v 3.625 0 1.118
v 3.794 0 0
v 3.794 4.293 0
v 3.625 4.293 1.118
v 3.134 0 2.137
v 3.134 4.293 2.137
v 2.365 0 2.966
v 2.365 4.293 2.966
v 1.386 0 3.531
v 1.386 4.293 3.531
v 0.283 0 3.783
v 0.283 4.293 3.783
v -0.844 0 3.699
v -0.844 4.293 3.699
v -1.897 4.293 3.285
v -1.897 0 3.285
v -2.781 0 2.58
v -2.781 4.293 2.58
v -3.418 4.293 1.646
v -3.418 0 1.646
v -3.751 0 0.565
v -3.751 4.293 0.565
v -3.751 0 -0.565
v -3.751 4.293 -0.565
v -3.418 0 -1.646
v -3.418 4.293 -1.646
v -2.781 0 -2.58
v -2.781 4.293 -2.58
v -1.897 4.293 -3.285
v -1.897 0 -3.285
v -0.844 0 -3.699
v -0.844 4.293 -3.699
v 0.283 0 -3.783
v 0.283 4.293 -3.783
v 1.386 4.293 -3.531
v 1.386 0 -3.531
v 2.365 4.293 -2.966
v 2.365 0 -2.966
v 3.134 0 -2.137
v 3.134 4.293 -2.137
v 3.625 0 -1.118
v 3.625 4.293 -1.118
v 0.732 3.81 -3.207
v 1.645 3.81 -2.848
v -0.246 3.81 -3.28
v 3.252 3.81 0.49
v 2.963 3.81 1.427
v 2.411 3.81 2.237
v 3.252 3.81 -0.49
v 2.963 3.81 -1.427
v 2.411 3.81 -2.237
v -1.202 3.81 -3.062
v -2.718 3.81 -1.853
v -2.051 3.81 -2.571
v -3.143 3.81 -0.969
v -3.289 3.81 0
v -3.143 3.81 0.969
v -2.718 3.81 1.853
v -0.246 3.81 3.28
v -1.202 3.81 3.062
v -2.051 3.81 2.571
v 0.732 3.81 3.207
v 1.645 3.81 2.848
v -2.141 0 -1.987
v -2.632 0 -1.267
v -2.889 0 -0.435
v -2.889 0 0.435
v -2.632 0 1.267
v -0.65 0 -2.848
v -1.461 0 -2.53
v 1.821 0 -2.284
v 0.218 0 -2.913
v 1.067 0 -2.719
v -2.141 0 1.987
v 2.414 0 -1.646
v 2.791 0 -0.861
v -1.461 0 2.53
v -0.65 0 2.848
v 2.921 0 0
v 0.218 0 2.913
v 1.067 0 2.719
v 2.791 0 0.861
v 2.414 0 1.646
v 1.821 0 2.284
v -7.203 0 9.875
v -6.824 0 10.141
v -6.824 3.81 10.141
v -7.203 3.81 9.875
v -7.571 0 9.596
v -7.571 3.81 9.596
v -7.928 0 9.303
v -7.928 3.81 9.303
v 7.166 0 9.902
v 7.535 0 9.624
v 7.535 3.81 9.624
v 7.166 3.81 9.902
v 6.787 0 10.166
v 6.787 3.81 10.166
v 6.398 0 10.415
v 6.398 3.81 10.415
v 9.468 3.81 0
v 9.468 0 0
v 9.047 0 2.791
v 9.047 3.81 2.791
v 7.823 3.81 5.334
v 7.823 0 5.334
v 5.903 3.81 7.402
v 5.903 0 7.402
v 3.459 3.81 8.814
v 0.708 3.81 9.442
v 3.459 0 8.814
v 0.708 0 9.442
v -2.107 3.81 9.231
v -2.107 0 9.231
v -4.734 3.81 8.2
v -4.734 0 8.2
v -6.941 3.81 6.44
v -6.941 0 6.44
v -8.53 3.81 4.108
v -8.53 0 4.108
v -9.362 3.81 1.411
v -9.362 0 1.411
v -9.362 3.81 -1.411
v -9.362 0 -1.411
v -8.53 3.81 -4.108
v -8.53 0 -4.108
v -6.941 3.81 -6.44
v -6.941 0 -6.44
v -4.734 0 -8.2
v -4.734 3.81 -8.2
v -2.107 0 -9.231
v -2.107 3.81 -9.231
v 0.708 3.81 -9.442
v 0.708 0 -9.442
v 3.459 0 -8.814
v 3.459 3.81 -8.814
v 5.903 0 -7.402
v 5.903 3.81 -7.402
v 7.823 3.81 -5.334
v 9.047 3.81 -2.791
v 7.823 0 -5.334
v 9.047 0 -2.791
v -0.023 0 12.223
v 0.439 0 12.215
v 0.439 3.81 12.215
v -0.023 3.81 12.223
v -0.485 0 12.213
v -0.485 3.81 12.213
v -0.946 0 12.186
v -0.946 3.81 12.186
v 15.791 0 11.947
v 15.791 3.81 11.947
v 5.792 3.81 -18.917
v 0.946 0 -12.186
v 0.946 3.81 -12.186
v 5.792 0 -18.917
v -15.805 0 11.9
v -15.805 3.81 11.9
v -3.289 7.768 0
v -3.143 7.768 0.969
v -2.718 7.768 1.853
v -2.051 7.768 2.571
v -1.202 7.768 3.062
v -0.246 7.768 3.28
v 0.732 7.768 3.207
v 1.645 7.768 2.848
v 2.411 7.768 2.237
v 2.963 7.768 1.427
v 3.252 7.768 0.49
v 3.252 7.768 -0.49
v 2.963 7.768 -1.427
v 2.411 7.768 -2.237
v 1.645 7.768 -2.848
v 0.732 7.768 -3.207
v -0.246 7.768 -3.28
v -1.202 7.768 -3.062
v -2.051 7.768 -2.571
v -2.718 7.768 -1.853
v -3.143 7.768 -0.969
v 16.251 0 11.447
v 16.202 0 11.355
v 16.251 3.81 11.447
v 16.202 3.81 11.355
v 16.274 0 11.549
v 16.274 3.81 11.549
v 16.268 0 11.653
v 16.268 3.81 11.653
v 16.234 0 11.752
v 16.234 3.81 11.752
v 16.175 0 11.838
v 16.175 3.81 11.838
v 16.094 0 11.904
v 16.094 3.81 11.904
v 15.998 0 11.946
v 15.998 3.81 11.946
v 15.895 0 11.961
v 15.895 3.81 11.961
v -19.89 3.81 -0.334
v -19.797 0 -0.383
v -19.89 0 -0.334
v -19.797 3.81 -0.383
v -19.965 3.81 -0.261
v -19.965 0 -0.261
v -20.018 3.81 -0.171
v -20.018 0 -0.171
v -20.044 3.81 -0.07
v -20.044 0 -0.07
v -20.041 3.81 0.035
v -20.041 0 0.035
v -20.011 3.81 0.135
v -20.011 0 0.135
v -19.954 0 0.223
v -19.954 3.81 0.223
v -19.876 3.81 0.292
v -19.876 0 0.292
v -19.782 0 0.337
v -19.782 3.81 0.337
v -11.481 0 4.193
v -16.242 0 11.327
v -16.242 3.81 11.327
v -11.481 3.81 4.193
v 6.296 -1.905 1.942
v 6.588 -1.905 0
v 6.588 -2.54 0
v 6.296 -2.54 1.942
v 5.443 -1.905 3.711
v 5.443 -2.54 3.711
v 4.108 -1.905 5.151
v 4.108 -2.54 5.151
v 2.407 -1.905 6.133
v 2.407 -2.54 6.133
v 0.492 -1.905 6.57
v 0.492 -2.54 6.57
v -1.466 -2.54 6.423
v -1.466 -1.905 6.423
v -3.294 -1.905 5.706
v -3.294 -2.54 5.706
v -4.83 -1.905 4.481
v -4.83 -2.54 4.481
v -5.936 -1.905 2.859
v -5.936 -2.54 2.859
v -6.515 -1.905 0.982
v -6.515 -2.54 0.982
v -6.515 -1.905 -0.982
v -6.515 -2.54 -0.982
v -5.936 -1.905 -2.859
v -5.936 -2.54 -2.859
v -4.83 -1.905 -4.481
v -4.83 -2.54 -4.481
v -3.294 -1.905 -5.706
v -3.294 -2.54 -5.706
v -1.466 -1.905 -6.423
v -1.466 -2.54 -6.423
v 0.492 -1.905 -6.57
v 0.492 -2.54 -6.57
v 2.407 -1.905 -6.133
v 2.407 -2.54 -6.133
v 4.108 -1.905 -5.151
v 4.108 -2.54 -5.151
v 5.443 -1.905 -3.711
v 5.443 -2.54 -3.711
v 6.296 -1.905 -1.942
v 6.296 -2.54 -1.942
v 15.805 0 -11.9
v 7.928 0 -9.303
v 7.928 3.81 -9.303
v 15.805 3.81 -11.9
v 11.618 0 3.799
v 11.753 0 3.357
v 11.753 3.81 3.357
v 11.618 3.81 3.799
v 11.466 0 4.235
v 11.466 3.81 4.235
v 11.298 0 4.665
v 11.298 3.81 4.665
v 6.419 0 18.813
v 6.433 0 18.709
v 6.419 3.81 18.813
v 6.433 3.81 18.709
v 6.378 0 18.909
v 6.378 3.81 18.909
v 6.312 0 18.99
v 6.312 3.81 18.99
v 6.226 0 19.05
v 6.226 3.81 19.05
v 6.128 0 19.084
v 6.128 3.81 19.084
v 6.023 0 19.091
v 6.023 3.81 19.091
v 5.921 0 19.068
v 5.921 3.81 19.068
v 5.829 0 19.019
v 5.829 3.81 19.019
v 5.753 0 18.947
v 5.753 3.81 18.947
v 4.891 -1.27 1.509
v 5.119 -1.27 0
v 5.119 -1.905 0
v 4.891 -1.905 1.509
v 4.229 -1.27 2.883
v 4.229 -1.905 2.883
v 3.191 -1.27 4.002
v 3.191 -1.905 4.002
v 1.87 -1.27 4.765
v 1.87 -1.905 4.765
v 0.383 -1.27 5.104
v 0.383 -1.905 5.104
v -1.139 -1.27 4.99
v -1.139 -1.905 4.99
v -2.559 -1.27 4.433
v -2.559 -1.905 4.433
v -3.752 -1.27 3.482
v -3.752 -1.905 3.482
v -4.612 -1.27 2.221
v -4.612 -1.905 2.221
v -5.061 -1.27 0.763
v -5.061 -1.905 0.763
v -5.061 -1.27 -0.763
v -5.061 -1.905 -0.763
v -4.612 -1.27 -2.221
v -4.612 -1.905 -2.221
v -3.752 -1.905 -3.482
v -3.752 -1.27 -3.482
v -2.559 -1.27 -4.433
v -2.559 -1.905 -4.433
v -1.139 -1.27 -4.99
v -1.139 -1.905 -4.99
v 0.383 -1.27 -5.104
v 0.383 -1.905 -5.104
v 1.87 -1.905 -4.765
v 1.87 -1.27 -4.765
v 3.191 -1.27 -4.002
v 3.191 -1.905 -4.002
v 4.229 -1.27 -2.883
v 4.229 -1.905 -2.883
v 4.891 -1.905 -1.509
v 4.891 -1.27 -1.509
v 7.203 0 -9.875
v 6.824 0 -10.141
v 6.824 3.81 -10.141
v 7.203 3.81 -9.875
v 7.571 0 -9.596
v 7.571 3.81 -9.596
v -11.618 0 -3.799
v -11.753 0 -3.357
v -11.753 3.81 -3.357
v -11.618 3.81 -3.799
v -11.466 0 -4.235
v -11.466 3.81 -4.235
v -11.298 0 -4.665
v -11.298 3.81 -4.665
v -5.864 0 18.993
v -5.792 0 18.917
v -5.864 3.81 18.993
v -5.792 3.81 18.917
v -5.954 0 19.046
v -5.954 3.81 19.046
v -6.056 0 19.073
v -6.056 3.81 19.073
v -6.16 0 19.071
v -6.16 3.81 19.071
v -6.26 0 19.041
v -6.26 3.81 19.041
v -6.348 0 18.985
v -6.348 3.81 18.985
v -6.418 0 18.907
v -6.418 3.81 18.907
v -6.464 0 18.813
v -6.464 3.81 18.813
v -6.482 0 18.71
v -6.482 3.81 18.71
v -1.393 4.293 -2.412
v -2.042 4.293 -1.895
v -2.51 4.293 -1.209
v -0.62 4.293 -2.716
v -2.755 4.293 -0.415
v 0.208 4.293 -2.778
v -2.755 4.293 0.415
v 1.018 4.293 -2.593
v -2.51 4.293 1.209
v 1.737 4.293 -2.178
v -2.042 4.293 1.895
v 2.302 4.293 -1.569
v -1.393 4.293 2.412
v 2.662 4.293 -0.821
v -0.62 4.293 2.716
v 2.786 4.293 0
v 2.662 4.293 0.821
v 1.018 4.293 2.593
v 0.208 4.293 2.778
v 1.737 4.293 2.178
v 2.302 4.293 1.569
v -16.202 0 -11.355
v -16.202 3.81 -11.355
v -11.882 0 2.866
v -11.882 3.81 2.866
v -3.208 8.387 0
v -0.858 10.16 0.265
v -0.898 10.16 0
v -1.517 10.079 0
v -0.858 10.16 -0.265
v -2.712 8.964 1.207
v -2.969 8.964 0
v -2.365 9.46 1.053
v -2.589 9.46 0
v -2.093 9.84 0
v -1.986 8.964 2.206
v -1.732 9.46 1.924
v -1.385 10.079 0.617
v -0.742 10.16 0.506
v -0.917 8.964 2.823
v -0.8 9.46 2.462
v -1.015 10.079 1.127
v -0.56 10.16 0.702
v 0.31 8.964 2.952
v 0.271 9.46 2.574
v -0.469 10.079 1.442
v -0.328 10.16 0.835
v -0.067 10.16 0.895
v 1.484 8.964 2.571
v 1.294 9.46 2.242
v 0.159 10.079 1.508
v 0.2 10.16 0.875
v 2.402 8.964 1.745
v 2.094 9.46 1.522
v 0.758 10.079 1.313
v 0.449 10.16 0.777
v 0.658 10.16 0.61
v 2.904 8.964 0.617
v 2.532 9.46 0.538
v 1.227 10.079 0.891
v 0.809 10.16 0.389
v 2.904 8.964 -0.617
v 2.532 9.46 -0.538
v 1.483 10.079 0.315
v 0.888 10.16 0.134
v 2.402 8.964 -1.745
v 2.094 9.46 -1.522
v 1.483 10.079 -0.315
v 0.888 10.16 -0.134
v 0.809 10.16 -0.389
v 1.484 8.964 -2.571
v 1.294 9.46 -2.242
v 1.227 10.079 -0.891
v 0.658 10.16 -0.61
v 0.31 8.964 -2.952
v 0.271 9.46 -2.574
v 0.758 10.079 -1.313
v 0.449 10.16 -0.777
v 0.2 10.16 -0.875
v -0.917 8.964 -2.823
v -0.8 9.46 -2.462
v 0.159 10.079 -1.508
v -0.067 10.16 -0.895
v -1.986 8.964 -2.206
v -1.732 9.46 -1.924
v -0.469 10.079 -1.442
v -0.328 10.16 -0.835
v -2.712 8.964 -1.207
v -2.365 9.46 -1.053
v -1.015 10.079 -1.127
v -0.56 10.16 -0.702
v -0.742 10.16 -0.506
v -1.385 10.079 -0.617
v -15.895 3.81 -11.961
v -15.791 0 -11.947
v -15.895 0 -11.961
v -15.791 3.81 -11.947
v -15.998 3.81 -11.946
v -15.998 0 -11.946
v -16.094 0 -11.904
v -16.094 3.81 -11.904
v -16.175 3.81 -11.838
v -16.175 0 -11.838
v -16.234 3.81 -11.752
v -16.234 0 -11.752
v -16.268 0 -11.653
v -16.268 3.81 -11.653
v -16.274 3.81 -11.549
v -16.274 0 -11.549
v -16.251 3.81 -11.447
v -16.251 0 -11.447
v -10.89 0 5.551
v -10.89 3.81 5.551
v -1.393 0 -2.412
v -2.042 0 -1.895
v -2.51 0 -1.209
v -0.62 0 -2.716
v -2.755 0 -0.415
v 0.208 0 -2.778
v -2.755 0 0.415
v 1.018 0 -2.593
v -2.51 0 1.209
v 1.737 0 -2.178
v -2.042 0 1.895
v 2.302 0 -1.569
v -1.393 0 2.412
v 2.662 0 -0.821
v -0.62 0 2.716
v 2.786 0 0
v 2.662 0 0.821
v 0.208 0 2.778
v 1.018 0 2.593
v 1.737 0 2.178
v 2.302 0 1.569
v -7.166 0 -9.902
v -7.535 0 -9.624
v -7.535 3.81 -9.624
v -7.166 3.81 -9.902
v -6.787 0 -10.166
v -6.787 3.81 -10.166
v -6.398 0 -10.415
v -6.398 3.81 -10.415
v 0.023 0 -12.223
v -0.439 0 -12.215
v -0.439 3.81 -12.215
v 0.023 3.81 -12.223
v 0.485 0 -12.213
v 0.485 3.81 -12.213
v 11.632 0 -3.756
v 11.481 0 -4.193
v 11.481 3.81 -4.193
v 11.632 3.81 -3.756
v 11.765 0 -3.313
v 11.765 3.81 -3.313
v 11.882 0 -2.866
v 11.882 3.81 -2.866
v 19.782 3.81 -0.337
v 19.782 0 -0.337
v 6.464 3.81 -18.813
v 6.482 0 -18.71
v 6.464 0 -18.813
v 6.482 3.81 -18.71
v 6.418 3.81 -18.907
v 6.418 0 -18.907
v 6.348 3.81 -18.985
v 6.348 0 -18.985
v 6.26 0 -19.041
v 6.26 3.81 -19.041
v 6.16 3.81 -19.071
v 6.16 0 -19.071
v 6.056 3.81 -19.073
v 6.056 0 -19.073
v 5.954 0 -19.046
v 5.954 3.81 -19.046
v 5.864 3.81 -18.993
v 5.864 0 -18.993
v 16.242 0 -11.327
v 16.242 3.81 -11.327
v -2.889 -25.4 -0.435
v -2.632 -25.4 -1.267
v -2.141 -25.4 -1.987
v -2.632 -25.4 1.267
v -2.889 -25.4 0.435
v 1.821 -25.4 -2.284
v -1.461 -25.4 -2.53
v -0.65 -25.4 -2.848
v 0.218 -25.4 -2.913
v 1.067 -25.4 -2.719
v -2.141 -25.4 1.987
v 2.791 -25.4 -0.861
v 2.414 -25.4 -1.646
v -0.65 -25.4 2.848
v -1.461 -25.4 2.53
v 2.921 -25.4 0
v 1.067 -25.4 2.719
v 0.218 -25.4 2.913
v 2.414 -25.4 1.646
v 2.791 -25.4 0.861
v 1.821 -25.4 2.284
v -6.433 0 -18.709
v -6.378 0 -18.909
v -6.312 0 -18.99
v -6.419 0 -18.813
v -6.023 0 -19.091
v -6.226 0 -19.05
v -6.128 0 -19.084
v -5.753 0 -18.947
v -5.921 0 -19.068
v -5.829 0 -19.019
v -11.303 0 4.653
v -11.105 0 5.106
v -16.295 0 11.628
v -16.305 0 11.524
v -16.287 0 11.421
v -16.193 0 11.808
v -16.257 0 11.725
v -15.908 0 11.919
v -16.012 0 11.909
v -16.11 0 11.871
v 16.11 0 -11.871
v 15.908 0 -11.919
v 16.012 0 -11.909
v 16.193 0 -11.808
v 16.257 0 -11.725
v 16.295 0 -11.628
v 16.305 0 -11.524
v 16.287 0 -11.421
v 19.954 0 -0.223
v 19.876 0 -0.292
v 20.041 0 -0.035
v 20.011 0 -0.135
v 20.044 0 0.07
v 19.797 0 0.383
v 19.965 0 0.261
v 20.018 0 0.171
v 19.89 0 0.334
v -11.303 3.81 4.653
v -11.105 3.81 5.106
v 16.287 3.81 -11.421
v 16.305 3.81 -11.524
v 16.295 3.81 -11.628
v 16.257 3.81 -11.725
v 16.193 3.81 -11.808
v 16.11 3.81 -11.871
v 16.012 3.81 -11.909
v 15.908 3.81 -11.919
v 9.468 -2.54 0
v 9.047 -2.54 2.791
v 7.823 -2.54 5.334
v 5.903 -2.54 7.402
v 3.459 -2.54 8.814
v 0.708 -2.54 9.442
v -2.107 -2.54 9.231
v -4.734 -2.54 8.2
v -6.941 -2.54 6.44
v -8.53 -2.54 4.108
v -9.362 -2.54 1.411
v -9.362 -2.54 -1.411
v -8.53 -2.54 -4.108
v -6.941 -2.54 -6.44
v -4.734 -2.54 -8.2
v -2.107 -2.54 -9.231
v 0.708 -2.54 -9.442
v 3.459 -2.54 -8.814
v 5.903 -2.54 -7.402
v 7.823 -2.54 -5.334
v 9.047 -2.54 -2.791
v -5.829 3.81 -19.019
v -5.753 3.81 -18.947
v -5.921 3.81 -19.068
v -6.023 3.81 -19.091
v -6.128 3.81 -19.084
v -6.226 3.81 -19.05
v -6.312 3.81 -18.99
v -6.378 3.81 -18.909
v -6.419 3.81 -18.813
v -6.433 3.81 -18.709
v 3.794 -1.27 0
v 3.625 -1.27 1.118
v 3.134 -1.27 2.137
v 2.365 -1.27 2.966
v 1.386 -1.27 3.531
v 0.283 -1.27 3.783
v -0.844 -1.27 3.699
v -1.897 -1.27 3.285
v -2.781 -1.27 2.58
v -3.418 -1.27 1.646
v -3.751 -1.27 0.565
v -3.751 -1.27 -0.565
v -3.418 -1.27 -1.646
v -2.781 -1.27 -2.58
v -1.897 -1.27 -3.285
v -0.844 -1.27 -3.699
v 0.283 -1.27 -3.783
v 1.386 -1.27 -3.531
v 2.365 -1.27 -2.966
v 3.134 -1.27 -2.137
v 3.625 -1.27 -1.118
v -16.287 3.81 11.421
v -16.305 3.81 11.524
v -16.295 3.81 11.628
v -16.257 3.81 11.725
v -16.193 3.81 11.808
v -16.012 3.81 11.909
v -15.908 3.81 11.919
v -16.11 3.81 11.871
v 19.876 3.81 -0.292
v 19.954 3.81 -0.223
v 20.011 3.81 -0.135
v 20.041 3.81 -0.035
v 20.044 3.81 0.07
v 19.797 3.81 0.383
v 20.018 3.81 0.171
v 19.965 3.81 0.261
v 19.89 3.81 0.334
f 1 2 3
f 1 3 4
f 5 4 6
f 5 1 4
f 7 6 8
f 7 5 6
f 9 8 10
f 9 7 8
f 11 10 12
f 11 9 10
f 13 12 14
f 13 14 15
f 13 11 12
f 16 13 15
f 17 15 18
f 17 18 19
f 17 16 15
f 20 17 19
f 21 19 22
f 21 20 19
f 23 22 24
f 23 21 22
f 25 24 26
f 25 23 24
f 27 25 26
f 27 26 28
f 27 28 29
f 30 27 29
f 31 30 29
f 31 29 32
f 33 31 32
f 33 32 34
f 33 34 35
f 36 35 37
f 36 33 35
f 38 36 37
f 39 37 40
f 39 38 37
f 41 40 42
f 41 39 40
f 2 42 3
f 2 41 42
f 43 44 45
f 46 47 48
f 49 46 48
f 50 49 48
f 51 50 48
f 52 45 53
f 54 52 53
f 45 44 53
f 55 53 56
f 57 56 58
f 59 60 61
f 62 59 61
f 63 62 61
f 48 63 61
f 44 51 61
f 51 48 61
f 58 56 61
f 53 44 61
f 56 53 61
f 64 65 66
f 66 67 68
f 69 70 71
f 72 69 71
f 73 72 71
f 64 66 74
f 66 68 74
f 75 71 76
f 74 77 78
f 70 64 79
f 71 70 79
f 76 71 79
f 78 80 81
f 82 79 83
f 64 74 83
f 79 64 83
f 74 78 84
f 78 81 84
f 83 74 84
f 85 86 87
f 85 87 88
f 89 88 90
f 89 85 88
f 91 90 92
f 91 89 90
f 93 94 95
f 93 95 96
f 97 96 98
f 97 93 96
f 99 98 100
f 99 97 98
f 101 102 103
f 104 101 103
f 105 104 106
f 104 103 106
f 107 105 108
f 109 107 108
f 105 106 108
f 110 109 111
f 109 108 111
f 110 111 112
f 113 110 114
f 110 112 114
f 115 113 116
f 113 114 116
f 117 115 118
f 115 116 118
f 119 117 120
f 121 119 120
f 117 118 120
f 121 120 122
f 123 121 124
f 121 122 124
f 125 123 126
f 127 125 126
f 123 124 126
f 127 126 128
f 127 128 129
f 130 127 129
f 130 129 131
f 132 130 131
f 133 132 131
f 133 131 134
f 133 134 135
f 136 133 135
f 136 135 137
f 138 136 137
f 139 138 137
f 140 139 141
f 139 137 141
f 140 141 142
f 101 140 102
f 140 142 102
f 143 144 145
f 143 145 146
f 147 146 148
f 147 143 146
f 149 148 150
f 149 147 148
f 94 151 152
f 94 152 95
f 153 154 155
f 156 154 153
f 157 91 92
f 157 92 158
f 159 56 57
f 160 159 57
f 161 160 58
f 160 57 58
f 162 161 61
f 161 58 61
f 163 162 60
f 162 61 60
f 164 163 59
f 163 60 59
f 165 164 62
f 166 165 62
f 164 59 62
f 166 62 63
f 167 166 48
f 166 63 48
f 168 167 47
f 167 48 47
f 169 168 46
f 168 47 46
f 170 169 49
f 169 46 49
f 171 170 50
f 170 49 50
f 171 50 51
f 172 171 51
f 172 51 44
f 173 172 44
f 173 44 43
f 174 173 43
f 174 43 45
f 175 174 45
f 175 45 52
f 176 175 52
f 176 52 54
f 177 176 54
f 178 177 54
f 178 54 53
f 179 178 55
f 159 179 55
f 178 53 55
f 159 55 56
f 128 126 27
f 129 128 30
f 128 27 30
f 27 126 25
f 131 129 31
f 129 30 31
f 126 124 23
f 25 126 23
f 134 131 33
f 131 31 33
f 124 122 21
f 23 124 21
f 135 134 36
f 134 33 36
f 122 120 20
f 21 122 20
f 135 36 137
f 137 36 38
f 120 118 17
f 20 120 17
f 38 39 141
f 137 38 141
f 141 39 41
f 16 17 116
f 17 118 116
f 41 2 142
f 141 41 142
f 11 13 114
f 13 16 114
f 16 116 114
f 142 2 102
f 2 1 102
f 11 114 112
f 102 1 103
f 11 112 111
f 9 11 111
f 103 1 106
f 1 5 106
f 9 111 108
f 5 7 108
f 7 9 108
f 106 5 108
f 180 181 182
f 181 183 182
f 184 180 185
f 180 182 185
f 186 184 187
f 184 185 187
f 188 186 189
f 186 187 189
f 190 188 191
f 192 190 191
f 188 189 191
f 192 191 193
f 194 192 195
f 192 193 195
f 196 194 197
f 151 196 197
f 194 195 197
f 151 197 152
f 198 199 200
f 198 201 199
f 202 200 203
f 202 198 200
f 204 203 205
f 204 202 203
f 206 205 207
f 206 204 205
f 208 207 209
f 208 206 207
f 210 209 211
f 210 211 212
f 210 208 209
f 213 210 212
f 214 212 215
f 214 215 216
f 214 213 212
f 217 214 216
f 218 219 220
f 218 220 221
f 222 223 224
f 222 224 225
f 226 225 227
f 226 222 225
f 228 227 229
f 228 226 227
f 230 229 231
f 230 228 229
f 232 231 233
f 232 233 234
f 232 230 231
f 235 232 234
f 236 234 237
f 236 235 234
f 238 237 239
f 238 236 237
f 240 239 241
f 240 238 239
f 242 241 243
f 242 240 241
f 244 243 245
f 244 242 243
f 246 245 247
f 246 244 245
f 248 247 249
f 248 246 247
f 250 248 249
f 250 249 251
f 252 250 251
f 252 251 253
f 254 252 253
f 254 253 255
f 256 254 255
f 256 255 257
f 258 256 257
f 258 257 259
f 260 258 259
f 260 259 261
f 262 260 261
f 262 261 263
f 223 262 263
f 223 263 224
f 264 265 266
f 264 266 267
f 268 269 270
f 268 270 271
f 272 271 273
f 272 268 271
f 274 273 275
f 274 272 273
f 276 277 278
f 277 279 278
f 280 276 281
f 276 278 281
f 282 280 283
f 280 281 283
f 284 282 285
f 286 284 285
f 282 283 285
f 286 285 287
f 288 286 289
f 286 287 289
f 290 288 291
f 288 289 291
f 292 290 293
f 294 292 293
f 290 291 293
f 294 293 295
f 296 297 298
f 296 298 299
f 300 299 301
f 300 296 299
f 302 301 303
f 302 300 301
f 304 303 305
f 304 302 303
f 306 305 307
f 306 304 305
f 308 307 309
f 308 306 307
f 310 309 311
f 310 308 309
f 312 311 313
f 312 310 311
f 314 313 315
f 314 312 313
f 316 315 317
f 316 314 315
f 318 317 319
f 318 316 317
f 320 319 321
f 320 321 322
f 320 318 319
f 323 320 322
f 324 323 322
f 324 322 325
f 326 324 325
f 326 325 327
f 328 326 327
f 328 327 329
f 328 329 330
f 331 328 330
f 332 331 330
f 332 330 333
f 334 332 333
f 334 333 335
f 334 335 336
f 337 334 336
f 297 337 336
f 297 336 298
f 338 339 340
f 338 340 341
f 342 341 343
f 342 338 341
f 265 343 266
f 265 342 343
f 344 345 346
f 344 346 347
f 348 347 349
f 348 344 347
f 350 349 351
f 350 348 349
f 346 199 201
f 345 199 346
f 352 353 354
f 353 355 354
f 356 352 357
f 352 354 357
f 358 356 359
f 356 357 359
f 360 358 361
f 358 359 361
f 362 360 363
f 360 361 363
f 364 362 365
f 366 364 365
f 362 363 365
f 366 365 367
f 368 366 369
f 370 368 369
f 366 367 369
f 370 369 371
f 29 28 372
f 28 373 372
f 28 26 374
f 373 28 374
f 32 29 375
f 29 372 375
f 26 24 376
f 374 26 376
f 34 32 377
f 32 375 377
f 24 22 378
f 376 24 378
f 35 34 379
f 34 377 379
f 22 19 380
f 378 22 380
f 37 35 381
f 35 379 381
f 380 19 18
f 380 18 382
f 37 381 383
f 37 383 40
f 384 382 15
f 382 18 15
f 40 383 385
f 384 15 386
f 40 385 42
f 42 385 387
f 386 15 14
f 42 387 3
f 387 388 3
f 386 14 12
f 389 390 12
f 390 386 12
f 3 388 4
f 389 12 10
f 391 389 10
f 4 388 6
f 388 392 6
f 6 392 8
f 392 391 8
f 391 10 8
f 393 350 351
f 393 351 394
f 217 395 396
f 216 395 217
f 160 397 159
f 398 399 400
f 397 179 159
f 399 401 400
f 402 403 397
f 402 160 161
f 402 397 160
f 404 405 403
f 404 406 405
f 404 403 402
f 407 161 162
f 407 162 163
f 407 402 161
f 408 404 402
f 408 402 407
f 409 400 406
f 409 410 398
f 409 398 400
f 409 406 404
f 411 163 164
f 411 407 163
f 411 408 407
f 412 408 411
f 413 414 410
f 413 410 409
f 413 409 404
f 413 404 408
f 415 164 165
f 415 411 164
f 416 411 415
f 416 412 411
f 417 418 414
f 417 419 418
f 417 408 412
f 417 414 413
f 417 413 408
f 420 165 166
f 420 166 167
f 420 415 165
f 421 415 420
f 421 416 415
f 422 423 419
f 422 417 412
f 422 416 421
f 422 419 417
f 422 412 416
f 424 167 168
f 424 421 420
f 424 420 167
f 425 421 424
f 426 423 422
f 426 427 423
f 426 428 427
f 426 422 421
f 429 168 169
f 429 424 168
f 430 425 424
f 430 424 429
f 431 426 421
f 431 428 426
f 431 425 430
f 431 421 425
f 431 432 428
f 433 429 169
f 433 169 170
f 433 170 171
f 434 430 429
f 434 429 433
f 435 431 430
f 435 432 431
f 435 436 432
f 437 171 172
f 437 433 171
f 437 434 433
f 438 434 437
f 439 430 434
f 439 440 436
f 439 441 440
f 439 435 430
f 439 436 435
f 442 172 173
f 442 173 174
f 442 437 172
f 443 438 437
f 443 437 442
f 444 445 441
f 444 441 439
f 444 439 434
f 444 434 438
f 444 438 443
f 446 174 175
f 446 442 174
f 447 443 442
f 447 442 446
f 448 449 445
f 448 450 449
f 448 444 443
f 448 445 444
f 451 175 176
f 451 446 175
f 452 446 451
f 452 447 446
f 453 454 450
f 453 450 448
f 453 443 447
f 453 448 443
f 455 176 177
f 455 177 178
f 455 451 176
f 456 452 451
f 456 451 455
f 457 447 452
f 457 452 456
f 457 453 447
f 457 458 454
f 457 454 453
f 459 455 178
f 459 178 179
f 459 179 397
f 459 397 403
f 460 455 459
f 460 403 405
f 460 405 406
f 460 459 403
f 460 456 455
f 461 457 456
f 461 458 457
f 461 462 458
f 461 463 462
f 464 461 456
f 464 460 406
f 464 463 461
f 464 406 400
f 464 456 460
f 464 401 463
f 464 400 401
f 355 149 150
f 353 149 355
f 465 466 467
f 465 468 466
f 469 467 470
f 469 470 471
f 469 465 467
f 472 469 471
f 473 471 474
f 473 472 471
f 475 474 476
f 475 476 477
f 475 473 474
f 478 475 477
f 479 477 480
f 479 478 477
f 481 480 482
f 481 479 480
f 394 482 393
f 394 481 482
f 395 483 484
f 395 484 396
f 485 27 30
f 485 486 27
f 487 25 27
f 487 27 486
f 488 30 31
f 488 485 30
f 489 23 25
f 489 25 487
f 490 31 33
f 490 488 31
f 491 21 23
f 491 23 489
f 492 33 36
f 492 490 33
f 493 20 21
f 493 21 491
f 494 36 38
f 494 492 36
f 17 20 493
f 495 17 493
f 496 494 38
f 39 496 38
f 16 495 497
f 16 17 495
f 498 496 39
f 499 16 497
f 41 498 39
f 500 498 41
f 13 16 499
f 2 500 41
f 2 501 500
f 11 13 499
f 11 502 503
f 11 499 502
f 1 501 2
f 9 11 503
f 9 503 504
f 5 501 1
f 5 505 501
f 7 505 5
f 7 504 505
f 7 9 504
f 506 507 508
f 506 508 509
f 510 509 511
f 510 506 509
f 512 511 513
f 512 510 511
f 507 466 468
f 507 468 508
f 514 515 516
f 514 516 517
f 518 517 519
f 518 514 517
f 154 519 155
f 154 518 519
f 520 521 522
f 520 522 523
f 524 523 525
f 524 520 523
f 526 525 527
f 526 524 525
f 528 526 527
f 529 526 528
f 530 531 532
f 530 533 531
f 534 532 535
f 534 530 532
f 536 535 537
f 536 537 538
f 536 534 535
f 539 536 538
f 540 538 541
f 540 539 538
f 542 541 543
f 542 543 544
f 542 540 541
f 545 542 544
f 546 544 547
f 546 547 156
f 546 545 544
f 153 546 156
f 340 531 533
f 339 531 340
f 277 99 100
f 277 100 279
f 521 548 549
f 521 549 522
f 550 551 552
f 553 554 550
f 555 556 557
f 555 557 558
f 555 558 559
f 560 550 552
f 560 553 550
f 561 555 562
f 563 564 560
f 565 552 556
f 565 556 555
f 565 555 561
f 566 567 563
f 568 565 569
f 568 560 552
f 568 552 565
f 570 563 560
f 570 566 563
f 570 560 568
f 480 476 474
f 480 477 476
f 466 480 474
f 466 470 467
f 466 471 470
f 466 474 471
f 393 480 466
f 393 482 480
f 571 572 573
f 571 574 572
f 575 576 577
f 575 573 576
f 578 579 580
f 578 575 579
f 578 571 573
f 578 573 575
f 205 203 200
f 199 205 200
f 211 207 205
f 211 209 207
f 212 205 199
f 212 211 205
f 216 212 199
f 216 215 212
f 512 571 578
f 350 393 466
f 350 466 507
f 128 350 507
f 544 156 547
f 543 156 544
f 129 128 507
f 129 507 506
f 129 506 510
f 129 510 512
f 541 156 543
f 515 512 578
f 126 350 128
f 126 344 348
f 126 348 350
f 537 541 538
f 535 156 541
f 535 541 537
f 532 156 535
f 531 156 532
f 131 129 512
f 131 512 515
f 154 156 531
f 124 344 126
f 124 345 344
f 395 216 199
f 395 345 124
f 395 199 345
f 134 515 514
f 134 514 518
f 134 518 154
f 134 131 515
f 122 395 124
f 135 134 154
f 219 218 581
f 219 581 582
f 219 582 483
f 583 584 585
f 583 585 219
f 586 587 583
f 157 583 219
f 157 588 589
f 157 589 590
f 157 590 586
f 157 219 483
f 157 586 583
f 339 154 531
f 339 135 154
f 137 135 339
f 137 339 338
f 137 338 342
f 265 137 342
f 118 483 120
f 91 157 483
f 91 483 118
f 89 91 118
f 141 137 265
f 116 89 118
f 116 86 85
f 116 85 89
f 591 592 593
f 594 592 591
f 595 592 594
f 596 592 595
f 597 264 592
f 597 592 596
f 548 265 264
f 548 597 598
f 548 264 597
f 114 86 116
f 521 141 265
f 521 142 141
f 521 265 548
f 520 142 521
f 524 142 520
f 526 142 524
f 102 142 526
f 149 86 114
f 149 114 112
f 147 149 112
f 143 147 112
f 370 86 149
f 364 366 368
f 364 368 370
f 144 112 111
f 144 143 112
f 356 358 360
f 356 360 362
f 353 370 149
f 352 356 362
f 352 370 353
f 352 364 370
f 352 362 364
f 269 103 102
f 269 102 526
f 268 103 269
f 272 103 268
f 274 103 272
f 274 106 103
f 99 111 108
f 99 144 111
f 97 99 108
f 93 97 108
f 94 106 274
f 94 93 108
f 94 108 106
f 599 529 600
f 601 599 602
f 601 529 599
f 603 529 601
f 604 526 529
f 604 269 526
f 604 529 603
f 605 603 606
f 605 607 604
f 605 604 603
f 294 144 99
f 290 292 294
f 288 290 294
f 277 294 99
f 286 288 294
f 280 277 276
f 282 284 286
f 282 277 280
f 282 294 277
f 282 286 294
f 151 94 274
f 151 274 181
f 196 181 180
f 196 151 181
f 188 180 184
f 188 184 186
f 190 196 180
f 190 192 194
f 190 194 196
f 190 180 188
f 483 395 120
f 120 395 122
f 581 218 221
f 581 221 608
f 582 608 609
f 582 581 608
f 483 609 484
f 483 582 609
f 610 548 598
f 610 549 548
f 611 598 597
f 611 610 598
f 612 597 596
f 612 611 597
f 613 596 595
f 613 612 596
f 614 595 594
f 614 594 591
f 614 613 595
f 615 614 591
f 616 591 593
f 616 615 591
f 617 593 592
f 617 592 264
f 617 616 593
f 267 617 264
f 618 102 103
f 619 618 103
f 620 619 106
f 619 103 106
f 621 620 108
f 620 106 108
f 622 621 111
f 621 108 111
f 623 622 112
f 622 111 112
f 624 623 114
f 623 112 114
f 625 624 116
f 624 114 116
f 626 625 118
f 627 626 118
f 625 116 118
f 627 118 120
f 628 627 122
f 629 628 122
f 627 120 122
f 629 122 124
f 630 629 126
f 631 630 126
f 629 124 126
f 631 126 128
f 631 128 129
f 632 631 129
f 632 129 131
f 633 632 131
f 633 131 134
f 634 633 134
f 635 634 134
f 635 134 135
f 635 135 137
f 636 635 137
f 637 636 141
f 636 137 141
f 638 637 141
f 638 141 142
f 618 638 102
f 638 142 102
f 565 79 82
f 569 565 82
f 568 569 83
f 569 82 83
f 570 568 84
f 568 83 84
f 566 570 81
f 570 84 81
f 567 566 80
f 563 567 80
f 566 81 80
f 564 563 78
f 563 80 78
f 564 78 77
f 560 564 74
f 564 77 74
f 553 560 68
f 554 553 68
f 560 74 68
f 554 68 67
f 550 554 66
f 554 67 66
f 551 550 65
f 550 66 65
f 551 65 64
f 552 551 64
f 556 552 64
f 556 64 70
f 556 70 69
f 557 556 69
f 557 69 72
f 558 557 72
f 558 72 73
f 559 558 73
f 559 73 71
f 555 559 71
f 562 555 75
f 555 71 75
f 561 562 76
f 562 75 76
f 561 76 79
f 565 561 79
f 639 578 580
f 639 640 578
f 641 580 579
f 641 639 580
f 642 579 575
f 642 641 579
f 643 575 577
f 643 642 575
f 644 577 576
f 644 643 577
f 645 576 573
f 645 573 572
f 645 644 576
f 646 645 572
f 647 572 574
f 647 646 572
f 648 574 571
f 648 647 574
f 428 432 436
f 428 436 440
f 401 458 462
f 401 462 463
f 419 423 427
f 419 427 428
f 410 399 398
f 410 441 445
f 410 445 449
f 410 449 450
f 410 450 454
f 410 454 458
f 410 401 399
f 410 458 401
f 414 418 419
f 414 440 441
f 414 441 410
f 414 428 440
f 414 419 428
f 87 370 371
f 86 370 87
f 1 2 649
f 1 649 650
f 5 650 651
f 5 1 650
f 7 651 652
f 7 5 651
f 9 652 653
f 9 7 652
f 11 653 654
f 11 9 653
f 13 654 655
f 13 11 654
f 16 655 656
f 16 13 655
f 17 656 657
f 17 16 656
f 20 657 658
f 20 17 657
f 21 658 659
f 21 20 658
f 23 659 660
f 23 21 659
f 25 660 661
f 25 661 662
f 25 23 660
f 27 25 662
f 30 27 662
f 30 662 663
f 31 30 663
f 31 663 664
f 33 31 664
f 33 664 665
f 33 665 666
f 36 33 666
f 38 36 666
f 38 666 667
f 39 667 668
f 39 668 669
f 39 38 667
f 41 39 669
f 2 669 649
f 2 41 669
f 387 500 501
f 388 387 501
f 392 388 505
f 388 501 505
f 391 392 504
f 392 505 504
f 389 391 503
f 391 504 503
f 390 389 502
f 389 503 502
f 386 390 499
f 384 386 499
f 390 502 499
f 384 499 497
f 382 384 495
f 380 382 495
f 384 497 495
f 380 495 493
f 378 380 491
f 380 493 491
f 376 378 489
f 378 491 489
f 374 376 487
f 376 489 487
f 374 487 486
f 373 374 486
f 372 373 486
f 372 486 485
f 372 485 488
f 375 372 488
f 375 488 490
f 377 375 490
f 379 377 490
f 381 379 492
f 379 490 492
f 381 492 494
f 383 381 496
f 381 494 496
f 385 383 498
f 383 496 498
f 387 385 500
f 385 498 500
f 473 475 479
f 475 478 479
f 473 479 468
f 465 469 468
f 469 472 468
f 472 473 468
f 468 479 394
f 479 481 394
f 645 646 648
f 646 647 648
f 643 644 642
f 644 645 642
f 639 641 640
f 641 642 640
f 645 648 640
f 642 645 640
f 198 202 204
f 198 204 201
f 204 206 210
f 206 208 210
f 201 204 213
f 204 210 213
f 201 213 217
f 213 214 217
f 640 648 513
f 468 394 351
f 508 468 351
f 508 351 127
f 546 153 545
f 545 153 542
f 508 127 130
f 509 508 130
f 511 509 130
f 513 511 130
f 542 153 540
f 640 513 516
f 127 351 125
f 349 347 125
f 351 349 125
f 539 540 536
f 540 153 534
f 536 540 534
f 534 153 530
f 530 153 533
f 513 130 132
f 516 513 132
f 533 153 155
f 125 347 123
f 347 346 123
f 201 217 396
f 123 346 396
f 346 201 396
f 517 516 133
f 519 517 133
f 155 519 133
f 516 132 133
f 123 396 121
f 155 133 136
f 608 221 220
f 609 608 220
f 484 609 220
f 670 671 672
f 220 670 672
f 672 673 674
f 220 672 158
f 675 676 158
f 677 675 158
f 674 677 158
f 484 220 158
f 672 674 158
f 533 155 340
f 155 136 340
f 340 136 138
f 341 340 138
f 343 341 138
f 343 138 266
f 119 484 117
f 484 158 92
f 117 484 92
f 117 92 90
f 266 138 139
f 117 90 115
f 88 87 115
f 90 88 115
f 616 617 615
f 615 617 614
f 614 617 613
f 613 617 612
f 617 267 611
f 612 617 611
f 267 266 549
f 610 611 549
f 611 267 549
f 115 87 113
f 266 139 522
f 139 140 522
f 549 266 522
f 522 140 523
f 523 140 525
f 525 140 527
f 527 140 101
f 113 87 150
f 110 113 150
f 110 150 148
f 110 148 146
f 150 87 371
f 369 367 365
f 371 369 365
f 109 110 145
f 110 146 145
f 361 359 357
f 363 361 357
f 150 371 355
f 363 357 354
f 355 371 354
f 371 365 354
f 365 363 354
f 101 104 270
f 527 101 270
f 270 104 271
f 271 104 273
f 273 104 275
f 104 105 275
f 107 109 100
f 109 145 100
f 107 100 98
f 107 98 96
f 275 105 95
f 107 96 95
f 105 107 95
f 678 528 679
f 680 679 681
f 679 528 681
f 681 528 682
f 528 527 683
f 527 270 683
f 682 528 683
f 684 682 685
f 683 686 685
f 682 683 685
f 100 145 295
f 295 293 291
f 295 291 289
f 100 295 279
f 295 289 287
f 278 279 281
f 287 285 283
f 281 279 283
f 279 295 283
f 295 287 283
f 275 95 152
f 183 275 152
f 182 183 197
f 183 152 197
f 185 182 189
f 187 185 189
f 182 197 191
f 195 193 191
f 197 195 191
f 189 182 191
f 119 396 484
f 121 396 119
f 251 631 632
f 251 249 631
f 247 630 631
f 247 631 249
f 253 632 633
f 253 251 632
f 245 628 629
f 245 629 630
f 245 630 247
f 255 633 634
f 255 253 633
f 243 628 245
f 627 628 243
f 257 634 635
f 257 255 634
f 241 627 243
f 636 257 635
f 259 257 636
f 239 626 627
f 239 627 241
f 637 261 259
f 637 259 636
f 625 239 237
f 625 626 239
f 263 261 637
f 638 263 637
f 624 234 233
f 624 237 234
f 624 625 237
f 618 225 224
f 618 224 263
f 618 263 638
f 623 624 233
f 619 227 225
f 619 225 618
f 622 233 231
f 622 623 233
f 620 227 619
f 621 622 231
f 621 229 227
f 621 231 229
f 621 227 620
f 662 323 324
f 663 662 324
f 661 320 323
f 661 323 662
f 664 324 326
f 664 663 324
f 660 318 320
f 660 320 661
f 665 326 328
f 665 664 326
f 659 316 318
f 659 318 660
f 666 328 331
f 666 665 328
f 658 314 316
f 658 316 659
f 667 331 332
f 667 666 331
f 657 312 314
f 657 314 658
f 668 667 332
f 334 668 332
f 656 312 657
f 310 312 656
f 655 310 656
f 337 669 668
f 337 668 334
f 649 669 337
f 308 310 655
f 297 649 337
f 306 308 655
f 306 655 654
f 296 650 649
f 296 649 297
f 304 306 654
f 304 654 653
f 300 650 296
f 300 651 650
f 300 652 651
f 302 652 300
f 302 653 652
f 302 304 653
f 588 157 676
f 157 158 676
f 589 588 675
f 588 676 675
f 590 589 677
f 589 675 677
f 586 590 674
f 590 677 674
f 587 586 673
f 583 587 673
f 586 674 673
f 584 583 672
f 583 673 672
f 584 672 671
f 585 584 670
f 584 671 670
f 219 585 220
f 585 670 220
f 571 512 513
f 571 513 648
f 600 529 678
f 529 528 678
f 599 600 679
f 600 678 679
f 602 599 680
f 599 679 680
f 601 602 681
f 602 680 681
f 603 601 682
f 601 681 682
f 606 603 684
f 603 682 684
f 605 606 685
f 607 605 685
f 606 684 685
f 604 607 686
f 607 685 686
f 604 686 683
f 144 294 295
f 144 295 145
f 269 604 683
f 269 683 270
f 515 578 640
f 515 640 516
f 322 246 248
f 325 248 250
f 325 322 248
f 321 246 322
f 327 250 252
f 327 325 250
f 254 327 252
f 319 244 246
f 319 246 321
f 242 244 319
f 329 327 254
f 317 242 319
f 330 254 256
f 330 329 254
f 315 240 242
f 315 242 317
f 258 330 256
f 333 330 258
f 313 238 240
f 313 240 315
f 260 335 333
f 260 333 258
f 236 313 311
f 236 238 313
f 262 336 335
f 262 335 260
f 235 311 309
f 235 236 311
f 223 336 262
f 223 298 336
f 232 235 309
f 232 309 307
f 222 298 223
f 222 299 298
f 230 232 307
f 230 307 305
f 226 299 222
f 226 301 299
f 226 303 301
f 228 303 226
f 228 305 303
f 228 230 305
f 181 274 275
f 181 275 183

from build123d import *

# Parameters (mm, degrees)
F0_R      = 9.467987
F1_DEPTH  = 3.81
F2_R      = 2.921246
F3_DEPTH  = 25.4
F4_R      = 3.289061
F5_DEPTH  = 6.35
F6_R      = 0.381
F0_R_2    = 6.588266
F7_DEPTH  = 2.54
F0_R_3    = 5.118567
F8_DEPTH  = 1.905
F0_R_4    = 3.793635
F9_DEPTH  = 1.27
F0_R_5    = 2.785674
F10_DEPTH = 4.2926
F11_R     = 2.39152


with BuildPart() as f1:
    # F0 (on Front) → F1 (new body)
    with BuildSketch(Plane.XZ):
        with BuildLine():
            ThreePointArc((11.753054, 3.356683), (12.10494, 1.69471), (12.222995, 0))
            ThreePointArc((12.222995, 0), (12.137491, -1.443232), (11.882175, -2.866272))
            Line((11.882175, -2.866272), (20.8341, 0))
            Line((20.8341, 0), (11.753054, 3.356683))
        make_face()
        with BuildLine():
            ThreePointArc((7.535412, 9.623886), (9.737443, 7.388086), (11.297634, 4.665305))
            Line((11.297634, 4.665305), (16.855141, 12.245976))
            Line((16.855141, 12.245976), (7.535412, 9.623886))
        make_face()
        with BuildLine():
            ThreePointArc((-6.824289, 10.140547), (-4.017452, 11.543903), (-0.945807, 12.186347))
            Line((-0.945807, 12.186347), (-6.438091, 19.814406))
            Line((-6.438091, 19.814406), (-6.824289, 10.140547))
        make_face()
        with BuildLine():
            ThreePointArc((0.439498, 12.215091), (3.535148, 11.700613), (6.397781, 10.414894))
            Line((6.397781, 10.414894), (6.438091, 19.814406))
            Line((6.438091, 19.814406), (0.439498, 12.215091))
        make_face()
        with BuildLine():
            ThreePointArc((-10.889778, 5.551066), (-9.59415, 7.573235), (-7.928129, 9.30303))
            Line((-7.928129, 9.30303), (-16.855141, 12.245976))
            Line((-16.855141, 12.245976), (-11.481429, 4.192659))
            ThreePointArc((-11.481429, 4.192659), (-11.206206, 4.880835), (-10.889778, 5.551066))
        make_face()
        with BuildLine():
            ThreePointArc((-11.753054, -3.356683), (-12.220365, -0.253562), (-11.882175, 2.866272))
            Line((-11.882175, 2.866272), (-20.8341, 0))
            Line((-20.8341, 0), (-11.753054, -3.356683))
        make_face()
        with BuildLine():
            Line((-16.855141, -12.245976), (-7.535412, -9.623886))
            ThreePointArc((-7.535412, -9.623886), (-9.737443, -7.388086), (-11.297634, -4.665305))
            Line((-11.297634, -4.665305), (-16.855141, -12.245976))
        make_face()
        with BuildLine():
            Line((-6.438091, -19.814406), (-0.439498, -12.215091))
            ThreePointArc((-0.439498, -12.215091), (-3.535148, -11.700613), (-6.397781, -10.414894))
            Line((-6.397781, -10.414894), (-6.438091, -19.814406))
        make_face()
        with BuildLine():
            Line((6.438091, -19.814406), (6.824289, -10.140547))
            ThreePointArc((6.824289, -10.140547), (4.017452, -11.543903), (0.945807, -12.186347))
            Line((0.945807, -12.186347), (6.438091, -19.814406))
        make_face()
        with BuildLine():
            Line((16.855141, -12.245976), (11.481429, -4.192659))
            ThreePointArc((11.481429, -4.192659), (10.035523, -6.977814), (7.928129, -9.30303))
            Line((7.928129, -9.30303), (16.855141, -12.245976))
        make_face()
        with BuildLine():
            ThreePointArc((11.882175, -2.866272), (12.137491, -1.443232), (12.222995, 0))
            ThreePointArc((12.222995, 0), (12.10494, 1.69471), (11.753054, 3.356683))
            ThreePointArc((11.753054, 3.356683), (11.543903, 4.017452), (11.297634, 4.665305))
            ThreePointArc((11.297634, 4.665305), (9.737443, 7.388086), (7.535412, 9.623886))
            ThreePointArc((7.535412, 9.623886), (6.977814, 10.035523), (6.397781, 10.414894))
            ThreePointArc((6.397781, 10.414894), (3.535148, 11.700613), (0.439498, 12.215091))
            ThreePointArc((0.439498, 12.215091), (-0.253562, 12.220365), (-0.945807, 12.186347))
            ThreePointArc((-0.945807, 12.186347), (-4.017452, 11.543903), (-6.824289, 10.140547))
            ThreePointArc((-6.824289, 10.140547), (-7.388086, 9.737443), (-7.928129, 9.30303))
            ThreePointArc((-7.928129, 9.30303), (-9.59415, 7.573235), (-10.889778, 5.551066))
            Line((-10.889778, 5.551066), (-11.882175, 2.866272))
            ThreePointArc((-11.882175, 2.866272), (-12.220365, -0.253562), (-11.753054, -3.356683))
            ThreePointArc((-11.753054, -3.356683), (-11.543903, -4.017452), (-11.297634, -4.665305))
            ThreePointArc((-11.297634, -4.665305), (-9.737443, -7.388086), (-7.535412, -9.623886))
            ThreePointArc((-7.535412, -9.623886), (-6.977814, -10.035523), (-6.397781, -10.414894))
            ThreePointArc((-6.397781, -10.414894), (-3.535148, -11.700613), (-0.439498, -12.215091))
            ThreePointArc((-0.439498, -12.215091), (0.253562, -12.220365), (0.945807, -12.186347))
            ThreePointArc((0.945807, -12.186347), (4.017452, -11.543903), (6.824289, -10.140547))
            ThreePointArc((6.824289, -10.140547), (7.388086, -9.737443), (7.928129, -9.30303))
            ThreePointArc((7.928129, -9.30303), (10.035523, -6.977814), (11.481429, -4.192659))
            ThreePointArc((11.481429, -4.192659), (11.700613, -3.535148), (11.882175, -2.866272))
        make_face()
        Circle(F0_R, mode=Mode.SUBTRACT)
    extrude(amount=-F1_DEPTH)

    # F6
    f6_edges = [f1.edges().sort_by_distance(p)[0] for p in [
        (-20.8341, 1.905, 0),
        (-16.855141, 1.905, -12.245976),
        (-6.438091, 1.905, -19.814406),
        (6.438091, 1.905, -19.814406),
        (16.855141, 1.905, -12.245976),
        (20.8341, 1.905, 0),
        (16.855141, 1.905, 12.245976),
        (6.438091, 1.905, 19.814406),
        (-6.438091, 1.905, 19.814406),
        (-16.855141, 1.905, 12.245976),
    ]]
    fillet(f6_edges, radius=F6_R)


with BuildPart() as f3:
    # F2 (on face) → F3 (new body)
    with BuildSketch(Plane.XZ):
        Circle(F2_R)
    extrude(amount=F3_DEPTH)


with BuildPart() as f5:
    # F4 (on face) → F5 (new body)
    with BuildSketch(Plane(origin=(0, 3.81, 0), x_dir=(-1, 0, 0), z_dir=(0, 1, 0))):
        Circle(F4_R)
    extrude(amount=F5_DEPTH)

    # F11
    f11_edges = [f5.edges().sort_by_distance(p)[0] for p in [
        (3.289061, 10.16, 0),
    ]]
    fillet(f11_edges, radius=F11_R)


with BuildPart() as f7:
    # F0 (on Front) → F7 (new body)
    with BuildSketch(Plane.XZ):
        Circle(F0_R)
        Circle(F0_R_2, mode=Mode.SUBTRACT)
    extrude(amount=F7_DEPTH)

    # F0 (on Front) → F8 (join)
    with BuildSketch(Plane.XZ):
        Circle(F0_R_2)
        Circle(F0_R_3, mode=Mode.SUBTRACT)
    extrude(amount=F8_DEPTH)

    # F0 (on Front) → F9 (join)
    with BuildSketch(Plane.XZ):
        Circle(F0_R_3)
        Circle(F0_R_4, mode=Mode.SUBTRACT)
    extrude(amount=F9_DEPTH)


with BuildPart() as f10:
    # F0 (on Front) → F10 (new body)
    with BuildSketch(Plane.XZ):
        Circle(F0_R_4)
        Circle(F0_R_5, mode=Mode.SUBTRACT)
    extrude(amount=-F10_DEPTH)


solid = Compound([f1.part, f3.part, f5.part, f7.part, f10.part])
